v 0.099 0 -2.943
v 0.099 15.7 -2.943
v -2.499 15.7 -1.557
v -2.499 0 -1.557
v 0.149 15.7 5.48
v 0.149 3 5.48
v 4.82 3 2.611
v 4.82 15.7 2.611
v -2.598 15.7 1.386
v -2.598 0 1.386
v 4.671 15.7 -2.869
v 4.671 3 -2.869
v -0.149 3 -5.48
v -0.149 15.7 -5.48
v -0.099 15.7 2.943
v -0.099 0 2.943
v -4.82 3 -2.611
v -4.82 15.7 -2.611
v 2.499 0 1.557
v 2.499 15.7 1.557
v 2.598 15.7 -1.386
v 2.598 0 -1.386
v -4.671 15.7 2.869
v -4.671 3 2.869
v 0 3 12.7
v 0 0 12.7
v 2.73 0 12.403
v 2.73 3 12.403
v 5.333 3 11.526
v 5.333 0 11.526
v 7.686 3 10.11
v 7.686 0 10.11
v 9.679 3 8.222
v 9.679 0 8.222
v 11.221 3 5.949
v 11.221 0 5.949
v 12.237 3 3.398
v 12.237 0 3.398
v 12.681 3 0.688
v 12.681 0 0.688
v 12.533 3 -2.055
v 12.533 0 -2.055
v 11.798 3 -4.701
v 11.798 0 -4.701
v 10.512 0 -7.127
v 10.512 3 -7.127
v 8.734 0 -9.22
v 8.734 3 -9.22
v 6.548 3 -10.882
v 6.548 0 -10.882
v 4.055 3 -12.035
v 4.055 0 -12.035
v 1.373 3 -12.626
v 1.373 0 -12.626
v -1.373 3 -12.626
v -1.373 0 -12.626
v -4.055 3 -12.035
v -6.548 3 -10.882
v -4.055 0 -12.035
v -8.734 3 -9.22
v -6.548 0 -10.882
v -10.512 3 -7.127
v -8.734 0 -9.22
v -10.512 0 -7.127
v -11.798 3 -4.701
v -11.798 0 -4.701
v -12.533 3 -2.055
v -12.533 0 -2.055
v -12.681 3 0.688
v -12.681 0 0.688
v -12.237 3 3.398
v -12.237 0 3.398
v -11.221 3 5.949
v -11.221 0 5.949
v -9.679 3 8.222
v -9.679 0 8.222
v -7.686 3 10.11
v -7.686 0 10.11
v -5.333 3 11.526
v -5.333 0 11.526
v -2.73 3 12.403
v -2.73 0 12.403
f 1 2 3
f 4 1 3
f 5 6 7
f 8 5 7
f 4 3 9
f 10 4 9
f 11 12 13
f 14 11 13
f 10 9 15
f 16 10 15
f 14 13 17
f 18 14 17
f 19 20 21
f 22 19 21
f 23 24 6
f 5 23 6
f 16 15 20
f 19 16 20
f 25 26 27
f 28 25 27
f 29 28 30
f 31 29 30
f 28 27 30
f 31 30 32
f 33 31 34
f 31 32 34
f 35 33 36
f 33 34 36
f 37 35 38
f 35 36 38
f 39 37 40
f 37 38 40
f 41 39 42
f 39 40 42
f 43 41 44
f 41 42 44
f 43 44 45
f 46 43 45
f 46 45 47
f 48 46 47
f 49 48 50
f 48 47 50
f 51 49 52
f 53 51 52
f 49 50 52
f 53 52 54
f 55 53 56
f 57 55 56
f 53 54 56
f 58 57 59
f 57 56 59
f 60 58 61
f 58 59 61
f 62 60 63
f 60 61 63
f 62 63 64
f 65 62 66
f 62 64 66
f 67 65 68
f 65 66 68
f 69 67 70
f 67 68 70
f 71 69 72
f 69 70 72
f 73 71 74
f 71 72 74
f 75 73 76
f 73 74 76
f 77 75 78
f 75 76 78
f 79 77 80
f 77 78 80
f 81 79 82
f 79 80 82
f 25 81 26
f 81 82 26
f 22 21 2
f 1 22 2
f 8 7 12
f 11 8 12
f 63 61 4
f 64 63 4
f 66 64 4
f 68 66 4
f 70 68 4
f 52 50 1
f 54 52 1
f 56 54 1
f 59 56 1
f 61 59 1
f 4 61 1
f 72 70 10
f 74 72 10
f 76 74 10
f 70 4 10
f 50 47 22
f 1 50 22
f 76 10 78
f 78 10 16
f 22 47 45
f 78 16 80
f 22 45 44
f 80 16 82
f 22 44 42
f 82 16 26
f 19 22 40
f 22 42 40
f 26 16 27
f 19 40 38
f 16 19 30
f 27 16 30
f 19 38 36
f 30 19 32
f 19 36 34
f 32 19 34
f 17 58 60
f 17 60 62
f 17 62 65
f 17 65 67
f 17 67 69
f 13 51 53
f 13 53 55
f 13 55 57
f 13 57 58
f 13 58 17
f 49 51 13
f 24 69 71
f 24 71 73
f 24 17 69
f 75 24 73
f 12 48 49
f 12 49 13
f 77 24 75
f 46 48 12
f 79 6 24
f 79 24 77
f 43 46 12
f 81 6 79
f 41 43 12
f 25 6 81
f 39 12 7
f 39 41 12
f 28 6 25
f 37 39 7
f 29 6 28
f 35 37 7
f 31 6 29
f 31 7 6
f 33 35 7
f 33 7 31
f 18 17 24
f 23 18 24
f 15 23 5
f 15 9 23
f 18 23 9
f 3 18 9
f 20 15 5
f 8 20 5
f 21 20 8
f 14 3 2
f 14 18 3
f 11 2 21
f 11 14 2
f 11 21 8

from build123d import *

# Parameters (mm, degrees)
SKETCH1_R           = 12.7
BOSS_EXTRUDE1_DEPTH = 3
BOSS_EXTRUDE2_DEPTH = 12.7
CUT_EXTRUDE1_DEPTH  = 23


with BuildPart() as part:
    # Sketch1 → Boss-Extrude1 (new body)
    with BuildSketch(Plane(origin=(0, 0, 0), x_dir=(1, 0, 0), z_dir=(0, 1, 0))):
        with Locations(Location((0, 0, 0), (0, 0, 270))):
            Circle(SKETCH1_R)
    extrude(amount=BOSS_EXTRUDE1_DEPTH)

    # Sketch2 → Boss-Extrude2 (add)
    with BuildSketch(Plane(origin=(0, 3, 0), x_dir=(1, 0, 0), z_dir=(0, 1, 0))):
        Polygon((0.148889151, -5.48), (4.820263788, -2.611058213), (4.671374637, 2.868941787), (-0.148889151, 5.48), (-4.820263788, 2.611058213), (-4.671374637, -2.868941787), align=None)
    extrude(amount=BOSS_EXTRUDE2_DEPTH)

    # Sketch6 → Cut-Extrude1 (cut)
    with BuildSketch(Plane(origin=(0, 15.7, 0), x_dir=(1, 0, 0), z_dir=(0, 1, 0))):
        Polygon((-2.597868549, -1.386029942), (-0.098597134, -2.94283513), (2.499271415, -1.556805188), (2.597868549, 1.386029942), (0.098597134, 2.94283513), (-2.499271415, 1.556805188), align=None)
    extrude(amount=-CUT_EXTRUDE1_DEPTH, mode=Mode.SUBTRACT)


solid = part.part
